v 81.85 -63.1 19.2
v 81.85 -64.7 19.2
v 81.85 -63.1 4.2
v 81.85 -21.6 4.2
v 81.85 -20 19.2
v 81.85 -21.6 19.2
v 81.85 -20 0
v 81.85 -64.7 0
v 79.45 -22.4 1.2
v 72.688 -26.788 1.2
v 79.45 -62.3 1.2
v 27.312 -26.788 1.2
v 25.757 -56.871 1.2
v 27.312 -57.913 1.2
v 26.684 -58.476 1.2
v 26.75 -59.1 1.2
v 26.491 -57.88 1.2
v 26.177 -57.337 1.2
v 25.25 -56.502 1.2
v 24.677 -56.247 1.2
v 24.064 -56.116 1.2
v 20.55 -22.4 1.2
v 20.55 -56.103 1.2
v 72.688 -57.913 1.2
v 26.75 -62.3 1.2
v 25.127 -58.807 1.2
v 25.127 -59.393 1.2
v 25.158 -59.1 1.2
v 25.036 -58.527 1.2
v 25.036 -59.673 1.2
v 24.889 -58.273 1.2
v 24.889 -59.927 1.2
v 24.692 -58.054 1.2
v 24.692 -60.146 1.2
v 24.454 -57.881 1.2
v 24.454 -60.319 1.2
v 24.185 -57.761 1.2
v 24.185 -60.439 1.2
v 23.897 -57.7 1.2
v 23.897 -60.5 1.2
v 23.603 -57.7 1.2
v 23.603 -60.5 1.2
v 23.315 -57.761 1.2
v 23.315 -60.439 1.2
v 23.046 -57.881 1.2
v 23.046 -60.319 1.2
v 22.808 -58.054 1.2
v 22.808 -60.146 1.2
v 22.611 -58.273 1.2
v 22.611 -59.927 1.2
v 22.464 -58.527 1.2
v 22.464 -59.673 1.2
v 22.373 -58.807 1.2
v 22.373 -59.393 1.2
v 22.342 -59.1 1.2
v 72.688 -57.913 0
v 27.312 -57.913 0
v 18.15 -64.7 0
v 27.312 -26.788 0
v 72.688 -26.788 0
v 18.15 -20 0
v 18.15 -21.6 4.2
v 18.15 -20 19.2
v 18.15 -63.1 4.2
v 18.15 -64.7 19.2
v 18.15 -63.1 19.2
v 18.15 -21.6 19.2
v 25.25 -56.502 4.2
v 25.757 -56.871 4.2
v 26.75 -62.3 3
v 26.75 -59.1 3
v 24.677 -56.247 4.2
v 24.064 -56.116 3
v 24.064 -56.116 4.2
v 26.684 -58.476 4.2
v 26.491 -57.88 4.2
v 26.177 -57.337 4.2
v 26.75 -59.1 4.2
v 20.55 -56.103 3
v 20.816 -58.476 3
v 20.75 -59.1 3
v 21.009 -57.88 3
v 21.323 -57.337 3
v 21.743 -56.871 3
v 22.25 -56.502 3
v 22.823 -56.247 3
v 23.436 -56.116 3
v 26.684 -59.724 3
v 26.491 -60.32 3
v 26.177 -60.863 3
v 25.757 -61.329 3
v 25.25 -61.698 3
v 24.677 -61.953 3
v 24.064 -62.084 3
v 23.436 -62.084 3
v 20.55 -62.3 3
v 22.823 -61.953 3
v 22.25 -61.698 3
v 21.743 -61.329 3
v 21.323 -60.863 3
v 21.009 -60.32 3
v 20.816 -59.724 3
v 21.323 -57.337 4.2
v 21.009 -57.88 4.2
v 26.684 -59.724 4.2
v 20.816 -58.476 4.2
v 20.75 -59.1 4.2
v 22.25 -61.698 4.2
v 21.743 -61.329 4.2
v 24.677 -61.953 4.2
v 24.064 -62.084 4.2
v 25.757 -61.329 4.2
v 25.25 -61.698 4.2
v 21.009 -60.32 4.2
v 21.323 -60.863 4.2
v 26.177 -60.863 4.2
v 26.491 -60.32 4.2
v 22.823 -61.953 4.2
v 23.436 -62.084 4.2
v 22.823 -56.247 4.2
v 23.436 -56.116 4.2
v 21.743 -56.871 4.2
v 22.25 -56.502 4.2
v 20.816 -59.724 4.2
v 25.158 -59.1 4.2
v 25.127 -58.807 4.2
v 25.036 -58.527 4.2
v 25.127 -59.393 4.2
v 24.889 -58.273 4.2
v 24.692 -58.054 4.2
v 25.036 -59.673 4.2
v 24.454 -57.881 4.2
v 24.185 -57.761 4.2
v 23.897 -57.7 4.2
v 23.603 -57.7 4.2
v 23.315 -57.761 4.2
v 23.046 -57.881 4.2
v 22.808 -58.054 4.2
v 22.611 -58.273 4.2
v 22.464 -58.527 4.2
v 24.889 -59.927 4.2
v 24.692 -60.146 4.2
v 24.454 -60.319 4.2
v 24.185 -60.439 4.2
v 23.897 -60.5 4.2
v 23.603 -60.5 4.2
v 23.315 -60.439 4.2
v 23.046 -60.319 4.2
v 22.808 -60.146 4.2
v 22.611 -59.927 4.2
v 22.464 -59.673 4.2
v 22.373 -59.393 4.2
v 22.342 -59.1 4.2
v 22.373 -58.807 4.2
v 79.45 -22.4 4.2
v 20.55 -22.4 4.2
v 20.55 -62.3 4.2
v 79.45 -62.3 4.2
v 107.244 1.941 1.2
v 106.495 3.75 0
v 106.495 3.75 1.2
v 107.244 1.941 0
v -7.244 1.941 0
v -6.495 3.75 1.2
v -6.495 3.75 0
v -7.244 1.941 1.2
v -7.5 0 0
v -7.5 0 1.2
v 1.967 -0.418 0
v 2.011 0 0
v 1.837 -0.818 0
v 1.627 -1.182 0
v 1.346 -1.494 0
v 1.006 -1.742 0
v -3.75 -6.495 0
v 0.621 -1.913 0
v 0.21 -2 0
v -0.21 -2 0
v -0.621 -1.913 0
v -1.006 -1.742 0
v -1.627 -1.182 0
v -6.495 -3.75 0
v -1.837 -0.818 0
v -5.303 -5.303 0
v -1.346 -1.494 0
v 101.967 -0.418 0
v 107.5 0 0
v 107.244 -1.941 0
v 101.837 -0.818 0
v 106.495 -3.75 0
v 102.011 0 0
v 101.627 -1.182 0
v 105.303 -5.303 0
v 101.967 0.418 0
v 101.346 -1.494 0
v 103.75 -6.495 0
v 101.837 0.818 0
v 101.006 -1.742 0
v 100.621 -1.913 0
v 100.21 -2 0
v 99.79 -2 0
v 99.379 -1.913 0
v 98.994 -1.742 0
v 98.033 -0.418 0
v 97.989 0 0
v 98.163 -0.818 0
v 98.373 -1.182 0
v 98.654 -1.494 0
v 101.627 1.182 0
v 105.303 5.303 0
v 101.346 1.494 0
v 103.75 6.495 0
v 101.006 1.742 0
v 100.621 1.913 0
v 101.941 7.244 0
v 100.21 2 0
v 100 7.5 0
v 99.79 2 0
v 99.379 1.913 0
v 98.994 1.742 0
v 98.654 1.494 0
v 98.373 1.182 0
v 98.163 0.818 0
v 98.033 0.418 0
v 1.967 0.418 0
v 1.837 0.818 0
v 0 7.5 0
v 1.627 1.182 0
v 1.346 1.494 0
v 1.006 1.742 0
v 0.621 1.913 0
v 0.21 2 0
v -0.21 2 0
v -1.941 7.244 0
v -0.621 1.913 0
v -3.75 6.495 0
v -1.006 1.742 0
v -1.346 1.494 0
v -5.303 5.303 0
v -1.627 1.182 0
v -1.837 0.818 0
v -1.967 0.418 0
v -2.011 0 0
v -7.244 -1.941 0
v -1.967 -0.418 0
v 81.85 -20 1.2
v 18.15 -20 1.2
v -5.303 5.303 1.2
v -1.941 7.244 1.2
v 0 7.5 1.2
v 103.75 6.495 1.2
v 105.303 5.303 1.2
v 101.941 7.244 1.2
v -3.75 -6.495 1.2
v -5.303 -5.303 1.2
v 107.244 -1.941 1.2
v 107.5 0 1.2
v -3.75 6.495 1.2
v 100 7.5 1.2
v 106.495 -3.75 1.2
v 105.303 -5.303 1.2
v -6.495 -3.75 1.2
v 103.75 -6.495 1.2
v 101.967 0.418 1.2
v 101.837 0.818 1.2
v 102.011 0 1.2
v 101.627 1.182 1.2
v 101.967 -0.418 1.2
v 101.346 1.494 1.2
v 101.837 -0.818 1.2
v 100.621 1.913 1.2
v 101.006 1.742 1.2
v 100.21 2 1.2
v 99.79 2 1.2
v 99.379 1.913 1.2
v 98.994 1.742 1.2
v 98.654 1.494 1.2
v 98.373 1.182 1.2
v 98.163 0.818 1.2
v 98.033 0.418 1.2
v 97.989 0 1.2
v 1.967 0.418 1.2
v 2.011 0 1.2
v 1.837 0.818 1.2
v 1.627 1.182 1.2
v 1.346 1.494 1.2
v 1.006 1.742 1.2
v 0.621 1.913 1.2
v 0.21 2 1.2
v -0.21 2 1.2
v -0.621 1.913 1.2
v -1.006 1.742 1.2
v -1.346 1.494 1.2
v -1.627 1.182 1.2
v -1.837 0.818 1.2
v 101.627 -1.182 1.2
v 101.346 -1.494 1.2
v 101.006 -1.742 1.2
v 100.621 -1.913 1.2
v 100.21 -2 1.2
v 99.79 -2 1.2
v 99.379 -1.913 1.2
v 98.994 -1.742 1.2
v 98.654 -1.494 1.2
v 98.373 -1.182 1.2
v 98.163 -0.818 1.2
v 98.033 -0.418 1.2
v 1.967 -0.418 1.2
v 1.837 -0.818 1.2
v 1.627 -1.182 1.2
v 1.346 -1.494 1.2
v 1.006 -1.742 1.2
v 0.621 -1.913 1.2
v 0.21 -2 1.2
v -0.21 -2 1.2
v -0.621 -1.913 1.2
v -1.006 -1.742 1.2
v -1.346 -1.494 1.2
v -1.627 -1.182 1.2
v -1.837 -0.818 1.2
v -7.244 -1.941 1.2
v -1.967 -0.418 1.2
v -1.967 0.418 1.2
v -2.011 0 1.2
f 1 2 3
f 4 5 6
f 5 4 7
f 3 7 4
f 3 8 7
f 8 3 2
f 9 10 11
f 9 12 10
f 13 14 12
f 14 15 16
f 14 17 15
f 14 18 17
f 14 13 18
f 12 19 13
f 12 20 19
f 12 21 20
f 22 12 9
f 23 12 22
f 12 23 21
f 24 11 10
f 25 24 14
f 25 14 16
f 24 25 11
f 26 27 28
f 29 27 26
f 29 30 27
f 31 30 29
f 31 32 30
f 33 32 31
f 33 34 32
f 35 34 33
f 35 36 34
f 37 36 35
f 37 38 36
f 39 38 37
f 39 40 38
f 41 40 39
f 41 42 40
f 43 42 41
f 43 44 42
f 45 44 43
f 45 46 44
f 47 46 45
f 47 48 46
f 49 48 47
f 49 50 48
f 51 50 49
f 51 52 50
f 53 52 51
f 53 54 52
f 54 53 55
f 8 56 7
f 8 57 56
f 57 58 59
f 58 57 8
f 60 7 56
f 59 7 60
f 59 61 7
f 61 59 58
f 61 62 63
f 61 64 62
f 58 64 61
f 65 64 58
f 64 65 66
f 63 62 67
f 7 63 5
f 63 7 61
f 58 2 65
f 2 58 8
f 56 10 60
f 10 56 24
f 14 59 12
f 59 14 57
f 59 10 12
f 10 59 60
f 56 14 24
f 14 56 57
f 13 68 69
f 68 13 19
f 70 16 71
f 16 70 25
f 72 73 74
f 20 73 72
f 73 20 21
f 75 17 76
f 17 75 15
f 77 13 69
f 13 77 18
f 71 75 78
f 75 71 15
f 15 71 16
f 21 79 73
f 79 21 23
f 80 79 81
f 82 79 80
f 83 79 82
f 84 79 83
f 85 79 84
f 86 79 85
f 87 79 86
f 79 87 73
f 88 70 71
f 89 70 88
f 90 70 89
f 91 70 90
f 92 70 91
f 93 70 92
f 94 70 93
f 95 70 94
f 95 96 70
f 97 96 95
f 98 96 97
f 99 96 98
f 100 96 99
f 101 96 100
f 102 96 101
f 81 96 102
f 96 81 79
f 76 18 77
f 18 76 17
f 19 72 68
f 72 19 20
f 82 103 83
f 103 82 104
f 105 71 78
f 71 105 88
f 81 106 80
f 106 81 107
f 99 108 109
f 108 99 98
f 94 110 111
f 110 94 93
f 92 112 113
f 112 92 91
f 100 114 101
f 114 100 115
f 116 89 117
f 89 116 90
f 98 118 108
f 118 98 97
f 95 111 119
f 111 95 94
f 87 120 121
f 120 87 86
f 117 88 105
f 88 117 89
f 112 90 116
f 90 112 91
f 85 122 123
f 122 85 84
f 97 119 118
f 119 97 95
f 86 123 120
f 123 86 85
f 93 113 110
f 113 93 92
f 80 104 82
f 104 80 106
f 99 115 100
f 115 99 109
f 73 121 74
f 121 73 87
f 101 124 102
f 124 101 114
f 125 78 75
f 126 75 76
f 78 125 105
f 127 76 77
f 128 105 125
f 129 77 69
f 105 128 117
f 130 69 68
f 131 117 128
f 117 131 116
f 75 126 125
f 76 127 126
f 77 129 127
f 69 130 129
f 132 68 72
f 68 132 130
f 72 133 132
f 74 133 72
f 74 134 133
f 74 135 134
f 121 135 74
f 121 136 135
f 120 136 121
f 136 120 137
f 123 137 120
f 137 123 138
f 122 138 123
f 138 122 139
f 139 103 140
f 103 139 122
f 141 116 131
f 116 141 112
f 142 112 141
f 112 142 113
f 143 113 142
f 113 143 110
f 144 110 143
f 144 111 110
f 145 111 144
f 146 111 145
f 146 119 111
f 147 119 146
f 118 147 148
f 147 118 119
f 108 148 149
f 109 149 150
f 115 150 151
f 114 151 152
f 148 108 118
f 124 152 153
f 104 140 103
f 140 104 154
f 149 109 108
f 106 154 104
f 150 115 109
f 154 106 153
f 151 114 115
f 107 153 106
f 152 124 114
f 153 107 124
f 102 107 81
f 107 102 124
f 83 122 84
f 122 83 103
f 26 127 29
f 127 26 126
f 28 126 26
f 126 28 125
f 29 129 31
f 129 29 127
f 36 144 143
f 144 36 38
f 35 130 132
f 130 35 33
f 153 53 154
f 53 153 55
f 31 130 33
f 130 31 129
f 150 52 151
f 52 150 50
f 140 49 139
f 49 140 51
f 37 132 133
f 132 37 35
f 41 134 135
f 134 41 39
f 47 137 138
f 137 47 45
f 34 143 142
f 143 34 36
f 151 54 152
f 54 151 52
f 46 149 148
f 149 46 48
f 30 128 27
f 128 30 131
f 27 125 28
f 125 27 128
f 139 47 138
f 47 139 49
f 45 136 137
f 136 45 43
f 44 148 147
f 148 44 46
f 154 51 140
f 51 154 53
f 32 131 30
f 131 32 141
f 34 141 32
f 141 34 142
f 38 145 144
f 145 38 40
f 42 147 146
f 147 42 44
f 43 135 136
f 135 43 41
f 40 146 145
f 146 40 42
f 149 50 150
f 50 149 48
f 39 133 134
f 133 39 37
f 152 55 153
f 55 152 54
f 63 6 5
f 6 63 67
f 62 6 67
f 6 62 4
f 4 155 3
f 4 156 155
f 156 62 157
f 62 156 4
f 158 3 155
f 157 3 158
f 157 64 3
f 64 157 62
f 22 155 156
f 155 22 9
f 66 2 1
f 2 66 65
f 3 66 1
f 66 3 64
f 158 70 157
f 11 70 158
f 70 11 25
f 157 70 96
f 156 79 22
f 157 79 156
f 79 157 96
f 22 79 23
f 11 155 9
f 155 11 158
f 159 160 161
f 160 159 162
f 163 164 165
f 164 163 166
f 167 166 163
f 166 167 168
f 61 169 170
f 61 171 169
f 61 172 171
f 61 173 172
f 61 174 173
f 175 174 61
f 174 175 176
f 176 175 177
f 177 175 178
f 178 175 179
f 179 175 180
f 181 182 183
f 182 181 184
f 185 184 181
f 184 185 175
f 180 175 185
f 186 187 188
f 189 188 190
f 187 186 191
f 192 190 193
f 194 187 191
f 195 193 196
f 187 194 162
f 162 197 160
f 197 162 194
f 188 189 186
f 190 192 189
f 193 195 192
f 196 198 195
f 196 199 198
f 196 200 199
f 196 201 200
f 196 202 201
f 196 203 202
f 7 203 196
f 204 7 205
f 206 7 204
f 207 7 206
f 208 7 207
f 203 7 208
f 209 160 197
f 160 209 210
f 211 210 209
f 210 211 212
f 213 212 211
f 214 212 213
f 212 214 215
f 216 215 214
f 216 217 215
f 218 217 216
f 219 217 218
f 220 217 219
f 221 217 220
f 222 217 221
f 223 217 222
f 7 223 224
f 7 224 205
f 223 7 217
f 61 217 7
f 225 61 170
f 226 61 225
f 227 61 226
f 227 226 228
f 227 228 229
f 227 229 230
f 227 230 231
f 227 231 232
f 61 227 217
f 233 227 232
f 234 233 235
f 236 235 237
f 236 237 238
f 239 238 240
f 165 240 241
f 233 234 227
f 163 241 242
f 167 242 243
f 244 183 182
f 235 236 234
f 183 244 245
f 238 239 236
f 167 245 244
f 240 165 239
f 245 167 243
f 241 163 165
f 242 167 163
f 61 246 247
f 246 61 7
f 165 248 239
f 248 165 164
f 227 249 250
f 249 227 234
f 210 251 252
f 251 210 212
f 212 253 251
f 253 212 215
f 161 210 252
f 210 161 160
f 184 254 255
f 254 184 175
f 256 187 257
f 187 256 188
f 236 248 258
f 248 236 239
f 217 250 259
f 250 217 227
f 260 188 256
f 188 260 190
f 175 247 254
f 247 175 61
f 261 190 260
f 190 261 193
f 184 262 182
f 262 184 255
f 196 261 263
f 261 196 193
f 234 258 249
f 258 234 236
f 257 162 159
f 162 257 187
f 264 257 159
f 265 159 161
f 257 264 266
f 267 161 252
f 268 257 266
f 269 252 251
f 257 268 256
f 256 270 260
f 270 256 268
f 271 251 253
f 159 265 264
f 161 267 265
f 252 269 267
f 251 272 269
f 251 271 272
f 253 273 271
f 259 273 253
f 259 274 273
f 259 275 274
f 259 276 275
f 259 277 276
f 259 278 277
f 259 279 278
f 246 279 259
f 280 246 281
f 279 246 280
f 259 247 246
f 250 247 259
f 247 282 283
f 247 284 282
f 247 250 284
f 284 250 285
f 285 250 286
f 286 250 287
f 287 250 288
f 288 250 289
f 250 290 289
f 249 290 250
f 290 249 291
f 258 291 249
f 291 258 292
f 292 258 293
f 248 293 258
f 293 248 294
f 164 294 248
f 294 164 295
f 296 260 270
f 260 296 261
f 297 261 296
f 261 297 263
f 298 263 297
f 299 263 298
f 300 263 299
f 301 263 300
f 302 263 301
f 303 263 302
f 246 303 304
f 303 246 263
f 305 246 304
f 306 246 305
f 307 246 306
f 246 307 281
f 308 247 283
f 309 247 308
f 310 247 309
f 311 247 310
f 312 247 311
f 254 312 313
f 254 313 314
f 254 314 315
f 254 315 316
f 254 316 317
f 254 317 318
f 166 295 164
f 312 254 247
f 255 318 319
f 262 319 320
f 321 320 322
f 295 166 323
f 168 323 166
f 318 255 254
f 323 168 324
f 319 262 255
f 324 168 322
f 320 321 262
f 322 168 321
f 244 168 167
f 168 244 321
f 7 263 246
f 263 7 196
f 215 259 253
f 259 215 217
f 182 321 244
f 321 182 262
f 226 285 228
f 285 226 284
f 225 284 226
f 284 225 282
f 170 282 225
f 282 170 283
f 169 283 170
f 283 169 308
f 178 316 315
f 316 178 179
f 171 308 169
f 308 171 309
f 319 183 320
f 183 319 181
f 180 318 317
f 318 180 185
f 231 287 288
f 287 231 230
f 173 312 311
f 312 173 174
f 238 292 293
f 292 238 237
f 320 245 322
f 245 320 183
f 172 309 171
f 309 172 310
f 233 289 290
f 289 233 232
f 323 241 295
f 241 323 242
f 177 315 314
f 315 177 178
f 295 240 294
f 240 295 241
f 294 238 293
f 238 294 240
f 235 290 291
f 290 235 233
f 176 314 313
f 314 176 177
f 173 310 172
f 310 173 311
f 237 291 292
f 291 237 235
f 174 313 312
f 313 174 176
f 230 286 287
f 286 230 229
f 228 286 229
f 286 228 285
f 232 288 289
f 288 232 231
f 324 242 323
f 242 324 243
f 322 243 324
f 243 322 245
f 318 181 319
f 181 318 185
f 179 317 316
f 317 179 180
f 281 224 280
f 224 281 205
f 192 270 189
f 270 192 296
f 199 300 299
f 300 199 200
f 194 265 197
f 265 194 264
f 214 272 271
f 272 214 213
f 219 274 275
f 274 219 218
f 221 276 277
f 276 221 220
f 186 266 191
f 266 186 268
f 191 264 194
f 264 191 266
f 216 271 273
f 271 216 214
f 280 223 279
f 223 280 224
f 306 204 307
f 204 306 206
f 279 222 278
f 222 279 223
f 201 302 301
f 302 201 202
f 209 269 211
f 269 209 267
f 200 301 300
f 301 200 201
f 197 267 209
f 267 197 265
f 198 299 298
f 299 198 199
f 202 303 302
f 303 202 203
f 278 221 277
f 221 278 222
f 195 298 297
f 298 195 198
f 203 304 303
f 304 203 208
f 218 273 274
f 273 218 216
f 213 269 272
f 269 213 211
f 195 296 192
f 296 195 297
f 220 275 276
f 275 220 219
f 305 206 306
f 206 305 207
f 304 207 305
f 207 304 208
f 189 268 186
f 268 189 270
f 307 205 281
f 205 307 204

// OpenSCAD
hole_diameter = 4;
mount_diameter = 15;
vesa_size = 100;
base_thickness = 1.2;
wall_thickness = 1.6;
use_four_holes = 0;  // [0:No, 1:Yes]
mount_offset = 20;
chip_length = 60.5;
chip_width = 41.5;
chip_height = 18;
riser_height = 3;
riser_width = 0.8;
mount_top = 1;  // [0:No, 1:Yes]
mount_bottom = 1;  // [0:No, 1:Yes]
mount_left = 0;  // [0:No, 1:Yes]
mount_right = 0;  // [0:No, 1:Yes]
riser_top = 1;  // [0:No, 1:Yes]
riser_bottom = 1;  // [0:No, 1:Yes]
riser_left = 1;  // [0:No, 1:Yes]
riser_right = 1;  // [0:No, 1:Yes]
lighten_mount = 1;  // [0:No, 1:Yes]
dual_mount = 0;  // [0:No, 1:Yes]
bottom_left_hole = 1;  // [0:No, 1:Yes]
bl_hole_x = 4;
bl_hole_y = 4;
bl_hole_diameter = 2.8;
bl_hole_thickness = 1.6;

hole_radius = hole_diameter / 2.0;
mount_radius = mount_diameter / 2.0;
mount_diag = sqrt(2.0) * vesa_size;
full_length = (dual_mount ? 2 : 1) * (2 * wall_thickness + chip_length);


module hole(radius, thickness){
  fn = 30;
  fudge = 1 / cos(180 / fn);
  translate([0, 0, -thickness*0.01]) {
    cylinder(h=thickness * 1.02, r=radius * fudge, $fn=fn);
  }
} 
  

module chip_mount(length, width, height, base_thickness, wall_thickness,
                  riser_width, riser_height,
                  mount_top, riser_top, mount_bottom, riser_bottom,
                  mount_left, riser_left, mount_right, riser_right, lighten,
                  bottom_left_hole, bl_hole_x, bl_hole_y, bl_hole_diameter,
                  bl_hole_thickness) {
  // Mount base
  difference() {
    cube([length + 2 * wall_thickness,
          width + 2 * wall_thickness,
          base_thickness]);
    if (lighten) {
      translate([wall_thickness + length * 0.125,
                 wall_thickness + width * 0.125,
                 -base_thickness * 0.1]) {
        cube([length * 0.75, width * 0.75, base_thickness * 1.2]);
      }
    }
  }
  // Mount top
  if (mount_top) {
    translate([0, wall_thickness + width, base_thickness]) {
      cube([length + 2 * wall_thickness, wall_thickness, height]);
    }
  }
  // Riser top
  if (riser_top) {
    translate([0, wall_thickness + width - riser_width, base_thickness]) {
      cube([length + 2 * wall_thickness,
            wall_thickness + riser_width,
            riser_height]);
    }
  }
  // Mount bottom
  if (mount_bottom) {
    cube([length + 2 * wall_thickness, wall_thickness, base_thickness + height]);
  }
  // Riser bottom
  if (riser_bottom) {
    cube([length + 2 * wall_thickness,
          wall_thickness + riser_width,
          base_thickness + riser_height]);
  }
  // Mount left
  if (mount_left) {
    cube([wall_thickness,
          width + 2 * wall_thickness,
          base_thickness + height]);
  }        
  // Riser left
  if (riser_left) {
    cube([wall_thickness + riser_width,
          width + 2 * wall_thickness,
          base_thickness + riser_height]);
  }        
  // Mount right
  if (mount_right) {
    translate([wall_thickness + length, 0, 0]) {
      cube([wall_thickness, width + 2 * wall_thickness, base_thickness + height]);
    }
  }
  // Riser right
  if (riser_right) {
    translate([wall_thickness + length - riser_width, 0, 0]) {
      cube([wall_thickness + riser_width,
            width + 2 * wall_thickness,
            base_thickness + riser_height]);
    }
  }
  // Bottom left hole
  if (bottom_left_hole) {
    bl_inner_radius = bl_hole_diameter * 0.5;
    bl_outer_radius = bl_inner_radius + bl_hole_thickness;
    support_height =
        (bl_hole_x < 6 && bl_hole_y < 6) ? riser_height : base_thickness;
    difference() {
      union() {
        hull() {
          cube([wall_thickness + bl_hole_x + bl_outer_radius,
                wall_thickness,
                support_height]);
          cube([wall_thickness,
                wall_thickness + bl_hole_y + bl_outer_radius,
                support_height]);
          translate([wall_thickness + bl_hole_x,
                     wall_thickness + bl_hole_y,
                     0]) {
            cylinder(r=bl_outer_radius, h=support_height, $fn=30);
          }
        }
        translate([wall_thickness + bl_hole_x, wall_thickness + bl_hole_y, 0]) {
          cylinder(r=bl_outer_radius, h=riser_height + base_thickness, $fn=30);
        }
      }
      translate([wall_thickness + bl_hole_x, wall_thickness + bl_hole_y, 0]) {
        hole(bl_inner_radius, riser_height + base_thickness);
      }
    }
    // Fill in the bottom of the hole
    translate([wall_thickness + bl_hole_x, wall_thickness + bl_hole_y, 0]) {
      cylinder(r=bl_outer_radius, h=base_thickness, $fn=30);
    }
  }
}

difference() {
  union() {
    if (use_four_holes) {
      // Mount-3
      translate([0, vesa_size, 0]) {
        cylinder(h=base_thickness, d=mount_diameter);
      }
      // Mount-4
      translate([vesa_size, vesa_size, 0]) {
        cylinder(h=base_thickness, d=mount_diameter);
      }
      // Connection 1-3
      translate([-mount_radius, 0, 0]) {
        cube([mount_diameter, vesa_size, base_thickness]);
      }
      // Connection 2-4
      translate([vesa_size - mount_radius, 0, 0]) {
        cube([mount_diameter, vesa_size, base_thickness]);
      }
      // Connection 1-4
      rotate([0,0, 45]) {
        translate([0, -mount_radius, 0]) {
          cube([mount_diag, mount_diameter, base_thickness]);
        }
      }
      // Connection 2-3
      translate([vesa_size, 0, 0]) {
        rotate([0,0, 135]) {
          translate([0, -mount_radius, 0]) {
            cube([mount_diag, mount_diameter, base_thickness]);
          }
        }
      }
    }
    // Main mount
    hull() {
      // Mount-1
      cylinder(h=base_thickness, d=mount_diameter);
      // Mount-2
      translate([vesa_size, 0, 0]) {
        cylinder(h=base_thickness, d=mount_diameter);
      }
      // Mount offset
      translate([(vesa_size - full_length) * 0.5, -mount_offset, 0]) {
        cube([full_length, wall_thickness, base_thickness]);
      }
    }
    translate([(vesa_size - full_length) * 0.5,
               -(mount_offset + 2 * wall_thickness + chip_width), 0]) {
      chip_mount(chip_length, chip_width, chip_height, base_thickness,
                 wall_thickness, riser_width, riser_height,
                 mount_top, riser_top, mount_bottom, riser_bottom,
                 mount_left, riser_left, mount_right, riser_right, lighten_mount,
                 bottom_left_hole, bl_hole_x, bl_hole_y, bl_hole_diameter,
                 bl_hole_thickness);
    }
    if (dual_mount) {
      translate([(vesa_size + full_length) * 0.5, -mount_offset, 0]) {
        rotate([0,0,180]) chip_mount(chip_length, chip_width, chip_height,
                   base_thickness, wall_thickness, riser_width, riser_height,
                   mount_top, riser_top, mount_bottom, riser_bottom,
                   mount_left, riser_left, mount_right, riser_right, lighten_mount,
                   bottom_left_hole, bl_hole_x, bl_hole_y, bl_hole_diameter,
                   bl_hole_thickness);
      }
    }
  }  // End union
  // Hole-1
  hole(hole_radius, base_thickness, $fn);
  // Hole-2
  translate([vesa_size, 0, 0]) {
    hole(hole_radius, base_thickness, $fn);
  }
  if (use_four_holes) {
    // Hole-3
    translate([0, vesa_size, 0]) {
      hole(hole_radius, base_thickness, $fn);
    }
    // Hole-4
    translate([vesa_size, vesa_size, 0]) {
      hole(hole_radius, base_thickness, $fn);
    }
  }
}  // End difference
